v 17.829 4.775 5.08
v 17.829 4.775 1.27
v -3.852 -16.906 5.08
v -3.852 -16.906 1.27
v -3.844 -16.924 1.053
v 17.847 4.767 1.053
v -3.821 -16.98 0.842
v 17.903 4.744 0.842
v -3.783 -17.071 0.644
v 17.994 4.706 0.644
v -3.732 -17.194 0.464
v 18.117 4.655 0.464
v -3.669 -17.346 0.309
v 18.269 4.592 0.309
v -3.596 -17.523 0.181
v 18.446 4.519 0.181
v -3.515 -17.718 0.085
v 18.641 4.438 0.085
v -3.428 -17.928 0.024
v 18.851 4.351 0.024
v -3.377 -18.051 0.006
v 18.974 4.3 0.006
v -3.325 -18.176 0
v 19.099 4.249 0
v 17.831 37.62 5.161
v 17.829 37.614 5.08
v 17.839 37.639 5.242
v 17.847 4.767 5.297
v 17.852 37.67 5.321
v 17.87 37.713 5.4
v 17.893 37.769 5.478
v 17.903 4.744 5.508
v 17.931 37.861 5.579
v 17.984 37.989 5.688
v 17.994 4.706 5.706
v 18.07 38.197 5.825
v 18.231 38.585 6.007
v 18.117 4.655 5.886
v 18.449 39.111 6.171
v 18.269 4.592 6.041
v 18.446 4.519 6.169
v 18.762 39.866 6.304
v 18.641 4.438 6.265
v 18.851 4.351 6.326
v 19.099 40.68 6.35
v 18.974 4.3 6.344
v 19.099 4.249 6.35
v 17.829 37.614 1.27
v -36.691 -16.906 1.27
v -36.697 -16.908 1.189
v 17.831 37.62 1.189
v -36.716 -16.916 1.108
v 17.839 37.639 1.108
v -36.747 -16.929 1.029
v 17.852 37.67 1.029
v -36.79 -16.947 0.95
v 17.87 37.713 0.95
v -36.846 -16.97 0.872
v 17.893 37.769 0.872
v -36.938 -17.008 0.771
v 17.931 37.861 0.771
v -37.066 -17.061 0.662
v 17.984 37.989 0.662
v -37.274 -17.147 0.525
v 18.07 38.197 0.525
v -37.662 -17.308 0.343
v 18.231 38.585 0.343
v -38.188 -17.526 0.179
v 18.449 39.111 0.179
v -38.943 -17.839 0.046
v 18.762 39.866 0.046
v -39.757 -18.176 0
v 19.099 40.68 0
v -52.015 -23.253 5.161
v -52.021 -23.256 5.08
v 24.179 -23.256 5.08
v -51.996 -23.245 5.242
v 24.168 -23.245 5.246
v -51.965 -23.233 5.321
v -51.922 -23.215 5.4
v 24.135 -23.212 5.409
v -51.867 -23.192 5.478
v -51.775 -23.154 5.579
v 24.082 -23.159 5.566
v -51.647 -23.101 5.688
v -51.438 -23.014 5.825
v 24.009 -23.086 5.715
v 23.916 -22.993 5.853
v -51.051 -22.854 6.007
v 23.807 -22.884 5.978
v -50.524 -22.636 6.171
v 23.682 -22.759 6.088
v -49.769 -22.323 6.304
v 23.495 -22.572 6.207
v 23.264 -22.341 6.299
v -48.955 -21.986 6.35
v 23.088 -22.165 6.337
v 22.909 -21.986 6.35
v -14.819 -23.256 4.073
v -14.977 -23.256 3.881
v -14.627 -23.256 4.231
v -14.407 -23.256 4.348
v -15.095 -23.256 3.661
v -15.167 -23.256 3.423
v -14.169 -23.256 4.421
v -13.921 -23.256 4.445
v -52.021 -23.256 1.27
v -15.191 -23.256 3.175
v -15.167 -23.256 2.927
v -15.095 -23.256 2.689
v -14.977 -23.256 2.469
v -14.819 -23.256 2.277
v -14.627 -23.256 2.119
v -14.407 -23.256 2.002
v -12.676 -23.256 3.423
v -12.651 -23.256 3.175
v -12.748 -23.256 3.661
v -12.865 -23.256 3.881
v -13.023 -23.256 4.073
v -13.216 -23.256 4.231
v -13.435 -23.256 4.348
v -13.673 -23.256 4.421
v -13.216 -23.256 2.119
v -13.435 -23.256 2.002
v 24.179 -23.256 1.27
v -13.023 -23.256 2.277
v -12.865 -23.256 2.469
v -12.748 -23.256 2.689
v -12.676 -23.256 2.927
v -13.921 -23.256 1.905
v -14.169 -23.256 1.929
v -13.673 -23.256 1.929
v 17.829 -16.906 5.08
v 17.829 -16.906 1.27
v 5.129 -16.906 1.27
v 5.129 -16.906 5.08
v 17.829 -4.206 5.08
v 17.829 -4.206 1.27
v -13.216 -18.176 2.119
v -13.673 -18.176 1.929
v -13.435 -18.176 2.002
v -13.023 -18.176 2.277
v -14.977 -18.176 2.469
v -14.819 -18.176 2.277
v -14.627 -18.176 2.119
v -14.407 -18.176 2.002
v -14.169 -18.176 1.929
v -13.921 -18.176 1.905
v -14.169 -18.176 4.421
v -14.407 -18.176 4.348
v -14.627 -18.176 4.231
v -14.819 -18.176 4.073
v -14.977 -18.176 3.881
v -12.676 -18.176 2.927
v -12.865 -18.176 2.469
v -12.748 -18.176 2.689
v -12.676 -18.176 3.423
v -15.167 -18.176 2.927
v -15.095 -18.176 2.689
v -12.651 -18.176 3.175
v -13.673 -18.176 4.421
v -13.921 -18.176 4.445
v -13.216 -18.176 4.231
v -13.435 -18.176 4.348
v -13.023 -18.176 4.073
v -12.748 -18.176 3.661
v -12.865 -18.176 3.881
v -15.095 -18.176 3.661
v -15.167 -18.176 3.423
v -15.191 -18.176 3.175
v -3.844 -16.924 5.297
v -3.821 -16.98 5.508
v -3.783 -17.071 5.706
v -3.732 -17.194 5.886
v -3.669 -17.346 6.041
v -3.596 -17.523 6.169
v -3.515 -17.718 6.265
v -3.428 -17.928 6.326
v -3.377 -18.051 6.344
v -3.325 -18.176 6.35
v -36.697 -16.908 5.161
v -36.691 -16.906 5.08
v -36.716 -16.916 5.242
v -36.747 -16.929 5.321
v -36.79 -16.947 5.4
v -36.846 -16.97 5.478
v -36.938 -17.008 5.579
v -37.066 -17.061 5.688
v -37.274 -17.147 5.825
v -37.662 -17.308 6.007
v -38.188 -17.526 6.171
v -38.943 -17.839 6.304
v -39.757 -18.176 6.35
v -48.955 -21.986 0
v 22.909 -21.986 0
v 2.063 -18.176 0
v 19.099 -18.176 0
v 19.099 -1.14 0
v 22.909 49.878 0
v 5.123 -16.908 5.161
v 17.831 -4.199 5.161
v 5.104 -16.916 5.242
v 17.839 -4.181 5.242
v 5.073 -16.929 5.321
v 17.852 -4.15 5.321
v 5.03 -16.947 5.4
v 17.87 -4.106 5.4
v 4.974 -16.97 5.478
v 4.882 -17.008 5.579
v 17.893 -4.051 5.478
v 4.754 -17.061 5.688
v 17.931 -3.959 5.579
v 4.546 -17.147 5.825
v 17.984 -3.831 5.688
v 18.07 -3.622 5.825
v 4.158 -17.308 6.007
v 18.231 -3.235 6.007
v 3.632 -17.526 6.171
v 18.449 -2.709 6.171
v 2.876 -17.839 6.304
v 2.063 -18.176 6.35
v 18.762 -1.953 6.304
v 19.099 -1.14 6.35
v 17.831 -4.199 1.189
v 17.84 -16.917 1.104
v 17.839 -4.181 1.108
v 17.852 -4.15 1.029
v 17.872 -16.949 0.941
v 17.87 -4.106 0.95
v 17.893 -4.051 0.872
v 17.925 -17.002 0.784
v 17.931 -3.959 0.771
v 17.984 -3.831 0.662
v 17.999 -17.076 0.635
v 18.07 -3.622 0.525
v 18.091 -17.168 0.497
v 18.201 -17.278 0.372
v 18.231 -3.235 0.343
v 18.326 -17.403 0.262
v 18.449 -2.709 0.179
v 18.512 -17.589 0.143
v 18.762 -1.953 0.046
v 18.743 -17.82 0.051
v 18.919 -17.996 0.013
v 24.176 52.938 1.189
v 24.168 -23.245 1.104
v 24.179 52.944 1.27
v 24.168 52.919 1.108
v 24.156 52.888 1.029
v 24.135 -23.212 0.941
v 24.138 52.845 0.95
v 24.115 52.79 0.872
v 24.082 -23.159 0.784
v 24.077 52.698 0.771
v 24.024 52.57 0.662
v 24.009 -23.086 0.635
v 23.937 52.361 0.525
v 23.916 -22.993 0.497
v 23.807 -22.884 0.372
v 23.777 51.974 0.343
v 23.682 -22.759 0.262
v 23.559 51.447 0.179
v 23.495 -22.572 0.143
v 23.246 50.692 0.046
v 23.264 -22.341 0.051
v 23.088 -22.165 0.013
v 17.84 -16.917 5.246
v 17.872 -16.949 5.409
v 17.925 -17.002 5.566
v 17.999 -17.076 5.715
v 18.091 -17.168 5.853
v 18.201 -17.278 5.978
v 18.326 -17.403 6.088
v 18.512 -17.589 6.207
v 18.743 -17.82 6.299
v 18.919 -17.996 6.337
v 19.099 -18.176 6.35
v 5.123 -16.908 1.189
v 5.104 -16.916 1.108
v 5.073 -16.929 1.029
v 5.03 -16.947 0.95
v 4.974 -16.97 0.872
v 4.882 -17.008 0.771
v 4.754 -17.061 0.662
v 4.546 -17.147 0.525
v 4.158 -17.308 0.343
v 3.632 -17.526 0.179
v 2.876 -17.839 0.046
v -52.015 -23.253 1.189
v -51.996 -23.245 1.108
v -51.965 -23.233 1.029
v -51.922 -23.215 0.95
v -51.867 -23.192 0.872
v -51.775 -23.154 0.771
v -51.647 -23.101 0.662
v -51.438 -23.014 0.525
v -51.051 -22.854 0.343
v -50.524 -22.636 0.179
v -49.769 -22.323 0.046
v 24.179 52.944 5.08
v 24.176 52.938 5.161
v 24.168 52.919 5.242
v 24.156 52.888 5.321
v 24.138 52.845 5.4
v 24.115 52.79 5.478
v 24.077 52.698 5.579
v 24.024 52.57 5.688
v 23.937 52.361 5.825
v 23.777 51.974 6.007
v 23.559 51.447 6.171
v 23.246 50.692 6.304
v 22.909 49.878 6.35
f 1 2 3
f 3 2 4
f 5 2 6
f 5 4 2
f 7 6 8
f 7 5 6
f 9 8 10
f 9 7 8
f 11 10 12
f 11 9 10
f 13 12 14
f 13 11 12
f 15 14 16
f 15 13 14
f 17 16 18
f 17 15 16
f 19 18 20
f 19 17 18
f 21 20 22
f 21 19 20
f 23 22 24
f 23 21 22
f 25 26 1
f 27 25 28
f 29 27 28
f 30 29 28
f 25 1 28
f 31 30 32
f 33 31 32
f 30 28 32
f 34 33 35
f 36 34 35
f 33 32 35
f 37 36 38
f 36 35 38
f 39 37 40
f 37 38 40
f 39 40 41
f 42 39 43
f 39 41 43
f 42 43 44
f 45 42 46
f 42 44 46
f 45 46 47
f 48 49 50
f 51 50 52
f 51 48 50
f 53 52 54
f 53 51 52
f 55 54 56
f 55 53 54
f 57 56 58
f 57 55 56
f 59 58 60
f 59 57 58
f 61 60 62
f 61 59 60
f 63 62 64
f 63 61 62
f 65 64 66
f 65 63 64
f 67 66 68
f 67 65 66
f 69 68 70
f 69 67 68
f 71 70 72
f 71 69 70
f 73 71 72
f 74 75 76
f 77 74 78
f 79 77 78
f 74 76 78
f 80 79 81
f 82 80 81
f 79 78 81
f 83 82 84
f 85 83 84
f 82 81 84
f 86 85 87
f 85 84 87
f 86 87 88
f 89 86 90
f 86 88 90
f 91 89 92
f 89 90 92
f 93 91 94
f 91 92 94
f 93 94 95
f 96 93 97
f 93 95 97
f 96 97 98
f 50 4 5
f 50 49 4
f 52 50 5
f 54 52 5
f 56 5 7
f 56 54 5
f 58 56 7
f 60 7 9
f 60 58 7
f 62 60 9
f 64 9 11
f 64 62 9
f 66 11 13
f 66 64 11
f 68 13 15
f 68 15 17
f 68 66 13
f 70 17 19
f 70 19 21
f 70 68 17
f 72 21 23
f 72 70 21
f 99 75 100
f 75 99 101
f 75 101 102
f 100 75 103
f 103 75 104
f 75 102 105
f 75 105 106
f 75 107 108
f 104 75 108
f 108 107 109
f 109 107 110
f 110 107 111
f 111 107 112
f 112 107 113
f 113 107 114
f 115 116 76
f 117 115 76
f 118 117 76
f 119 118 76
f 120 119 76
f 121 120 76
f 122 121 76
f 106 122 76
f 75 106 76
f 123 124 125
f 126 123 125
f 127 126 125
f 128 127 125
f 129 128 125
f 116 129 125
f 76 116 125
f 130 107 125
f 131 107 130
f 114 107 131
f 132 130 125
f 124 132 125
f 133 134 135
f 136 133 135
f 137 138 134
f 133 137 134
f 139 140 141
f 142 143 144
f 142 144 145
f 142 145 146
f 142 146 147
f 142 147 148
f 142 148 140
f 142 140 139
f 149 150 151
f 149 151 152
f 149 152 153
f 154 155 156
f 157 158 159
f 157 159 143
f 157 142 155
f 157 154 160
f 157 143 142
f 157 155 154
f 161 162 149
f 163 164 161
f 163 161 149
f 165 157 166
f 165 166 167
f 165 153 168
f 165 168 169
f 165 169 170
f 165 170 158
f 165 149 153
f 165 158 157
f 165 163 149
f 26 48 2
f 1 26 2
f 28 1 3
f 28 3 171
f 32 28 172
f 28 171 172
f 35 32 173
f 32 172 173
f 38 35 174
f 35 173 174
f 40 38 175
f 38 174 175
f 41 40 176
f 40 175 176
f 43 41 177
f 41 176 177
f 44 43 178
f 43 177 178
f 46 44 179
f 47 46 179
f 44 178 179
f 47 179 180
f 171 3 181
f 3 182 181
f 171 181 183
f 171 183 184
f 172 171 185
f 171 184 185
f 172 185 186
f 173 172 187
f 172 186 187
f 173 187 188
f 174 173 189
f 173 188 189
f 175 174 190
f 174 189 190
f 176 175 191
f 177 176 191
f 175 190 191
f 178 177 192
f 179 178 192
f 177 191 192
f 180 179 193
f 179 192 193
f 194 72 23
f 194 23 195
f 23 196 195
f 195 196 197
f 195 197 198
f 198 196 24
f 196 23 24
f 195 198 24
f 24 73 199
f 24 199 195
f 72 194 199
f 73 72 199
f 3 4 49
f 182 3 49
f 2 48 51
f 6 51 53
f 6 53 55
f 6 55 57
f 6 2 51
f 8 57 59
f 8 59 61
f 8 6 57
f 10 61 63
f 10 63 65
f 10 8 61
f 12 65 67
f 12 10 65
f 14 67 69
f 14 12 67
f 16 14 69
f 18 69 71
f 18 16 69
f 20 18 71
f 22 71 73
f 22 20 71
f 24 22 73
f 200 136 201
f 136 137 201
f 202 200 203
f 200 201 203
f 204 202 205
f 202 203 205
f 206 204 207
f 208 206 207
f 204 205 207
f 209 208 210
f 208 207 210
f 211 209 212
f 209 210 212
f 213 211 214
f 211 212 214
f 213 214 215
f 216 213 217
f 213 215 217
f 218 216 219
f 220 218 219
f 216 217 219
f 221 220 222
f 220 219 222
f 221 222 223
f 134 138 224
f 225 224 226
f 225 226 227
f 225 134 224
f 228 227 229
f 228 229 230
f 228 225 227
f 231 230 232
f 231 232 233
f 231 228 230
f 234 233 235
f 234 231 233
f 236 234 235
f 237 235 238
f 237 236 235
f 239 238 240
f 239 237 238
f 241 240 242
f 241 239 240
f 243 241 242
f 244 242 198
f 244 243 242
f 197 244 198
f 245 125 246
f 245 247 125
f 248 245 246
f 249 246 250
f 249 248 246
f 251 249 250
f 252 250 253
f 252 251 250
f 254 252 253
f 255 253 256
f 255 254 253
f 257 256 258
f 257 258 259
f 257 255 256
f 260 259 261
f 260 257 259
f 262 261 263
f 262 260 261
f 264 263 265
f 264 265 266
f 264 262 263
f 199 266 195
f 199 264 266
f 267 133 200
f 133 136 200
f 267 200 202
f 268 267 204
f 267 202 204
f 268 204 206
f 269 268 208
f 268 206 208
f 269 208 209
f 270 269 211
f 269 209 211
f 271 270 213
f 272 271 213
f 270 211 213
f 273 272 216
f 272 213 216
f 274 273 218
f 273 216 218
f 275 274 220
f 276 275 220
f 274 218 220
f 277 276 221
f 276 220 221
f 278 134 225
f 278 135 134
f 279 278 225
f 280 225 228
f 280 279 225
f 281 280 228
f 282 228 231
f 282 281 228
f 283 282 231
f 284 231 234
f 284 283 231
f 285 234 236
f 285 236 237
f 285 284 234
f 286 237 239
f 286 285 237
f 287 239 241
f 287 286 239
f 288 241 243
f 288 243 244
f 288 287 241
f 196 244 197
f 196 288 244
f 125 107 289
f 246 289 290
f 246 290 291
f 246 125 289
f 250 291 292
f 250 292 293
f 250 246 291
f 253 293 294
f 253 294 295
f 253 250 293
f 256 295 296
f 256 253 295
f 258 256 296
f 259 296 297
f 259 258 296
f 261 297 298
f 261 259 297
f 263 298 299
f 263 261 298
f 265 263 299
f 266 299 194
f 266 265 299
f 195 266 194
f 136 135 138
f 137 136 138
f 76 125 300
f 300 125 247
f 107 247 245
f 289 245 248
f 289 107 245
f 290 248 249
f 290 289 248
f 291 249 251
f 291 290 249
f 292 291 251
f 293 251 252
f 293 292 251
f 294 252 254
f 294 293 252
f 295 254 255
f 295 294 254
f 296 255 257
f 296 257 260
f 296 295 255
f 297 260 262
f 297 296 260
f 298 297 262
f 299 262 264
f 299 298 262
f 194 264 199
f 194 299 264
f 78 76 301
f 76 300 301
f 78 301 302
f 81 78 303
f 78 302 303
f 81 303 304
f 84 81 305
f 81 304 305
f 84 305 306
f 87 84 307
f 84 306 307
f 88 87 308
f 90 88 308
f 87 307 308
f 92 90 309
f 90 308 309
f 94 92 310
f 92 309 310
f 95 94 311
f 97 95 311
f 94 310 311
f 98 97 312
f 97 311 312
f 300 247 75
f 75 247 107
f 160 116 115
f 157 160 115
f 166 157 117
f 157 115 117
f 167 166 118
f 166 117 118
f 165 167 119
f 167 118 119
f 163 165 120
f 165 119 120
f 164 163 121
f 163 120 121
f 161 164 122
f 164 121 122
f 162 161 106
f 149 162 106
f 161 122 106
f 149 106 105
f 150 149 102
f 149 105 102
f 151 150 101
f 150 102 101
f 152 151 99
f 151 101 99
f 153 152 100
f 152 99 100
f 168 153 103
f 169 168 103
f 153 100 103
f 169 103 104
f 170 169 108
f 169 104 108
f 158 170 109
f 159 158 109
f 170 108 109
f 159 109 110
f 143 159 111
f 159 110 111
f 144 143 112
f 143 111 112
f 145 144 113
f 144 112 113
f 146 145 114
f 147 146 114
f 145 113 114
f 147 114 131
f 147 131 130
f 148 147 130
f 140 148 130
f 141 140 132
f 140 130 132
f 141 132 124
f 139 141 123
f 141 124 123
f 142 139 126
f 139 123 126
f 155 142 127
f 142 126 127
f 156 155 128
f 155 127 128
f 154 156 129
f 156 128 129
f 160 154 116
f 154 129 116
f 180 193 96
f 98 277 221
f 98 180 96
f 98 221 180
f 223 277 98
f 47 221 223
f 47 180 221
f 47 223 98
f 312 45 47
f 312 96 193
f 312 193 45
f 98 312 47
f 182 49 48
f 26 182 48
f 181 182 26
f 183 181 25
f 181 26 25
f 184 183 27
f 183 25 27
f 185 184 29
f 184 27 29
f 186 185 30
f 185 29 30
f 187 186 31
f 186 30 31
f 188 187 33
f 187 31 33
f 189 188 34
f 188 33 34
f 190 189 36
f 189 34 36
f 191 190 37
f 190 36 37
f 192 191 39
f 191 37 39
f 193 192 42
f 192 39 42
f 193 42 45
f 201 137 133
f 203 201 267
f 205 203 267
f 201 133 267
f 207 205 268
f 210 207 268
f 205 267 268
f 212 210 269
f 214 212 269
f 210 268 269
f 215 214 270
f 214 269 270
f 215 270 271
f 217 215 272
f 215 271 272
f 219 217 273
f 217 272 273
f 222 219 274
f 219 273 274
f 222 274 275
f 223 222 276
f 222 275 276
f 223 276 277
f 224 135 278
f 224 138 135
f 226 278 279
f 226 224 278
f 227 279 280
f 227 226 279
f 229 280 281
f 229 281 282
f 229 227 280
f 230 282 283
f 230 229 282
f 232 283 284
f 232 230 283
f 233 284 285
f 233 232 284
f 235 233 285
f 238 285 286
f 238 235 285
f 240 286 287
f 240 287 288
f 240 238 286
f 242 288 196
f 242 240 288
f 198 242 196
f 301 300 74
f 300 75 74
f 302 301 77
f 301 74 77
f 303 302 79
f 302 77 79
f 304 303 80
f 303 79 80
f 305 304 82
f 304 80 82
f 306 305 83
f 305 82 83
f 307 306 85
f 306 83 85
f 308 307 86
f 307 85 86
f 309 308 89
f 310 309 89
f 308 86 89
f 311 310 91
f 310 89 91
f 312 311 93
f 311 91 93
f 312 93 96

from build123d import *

# Parameters (mm, degrees)
F1_DEPTH = 6.35
F3_R     = 1.27
F2_R     = 1.27
F4_DEPTH = 5.08


with BuildPart() as f1:
    # F0 (on Top) → F1 (new body)
    with BuildSketch(Plane.XY):
        Polygon((24.178737, 52.94433), (-52.021263, -23.25567), (24.178737, -23.25567), align=None)
        Polygon((17.828737, -16.90567), (5.128737, -16.90567), (17.828737, -4.20567), align=None, mode=Mode.SUBTRACT)
        Polygon((-3.851519, -16.90567), (-36.691007, -16.90567), (17.828737, 37.614073), (17.828737, 4.774586), align=None, mode=Mode.SUBTRACT)
    extrude(amount=F1_DEPTH)

    # F3
    f3_edges = [f1.edges().sort_by_distance(p)[0] for p in [
        (-13.921263, 14.84433, 6.35),
        (-13.921263, -23.25567, 6.35),
        (24.178737, 14.84433, 6.35),
        (11.478737, -16.90567, 6.35),
        (11.478737, -10.55567, 6.35),
        (17.828737, -10.55567, 6.35),
        (17.828737, 21.19433, 6.35),
        (6.988609, -6.065542, 6.35),
        (-20.271263, -16.90567, 6.35),
        (-9.431135, 10.354202, 6.35),
        (-13.921263, -23.25567, 0),
        (-13.921263, 14.84433, 0),
        (24.178737, 14.84433, 0),
        (11.478737, -16.90567, 0),
        (11.478737, -10.55567, 0),
        (17.828737, -10.55567, 0),
        (17.828737, 21.19433, 0),
        (6.988609, -6.065542, 0),
        (-20.271263, -16.90567, 0),
        (-9.431135, 10.354202, 0),
    ]]
    fillet(f3_edges, radius=F3_R)

    # F2 (on face) → F4 (cut)
    with BuildSketch(Plane.XZ.offset(23.25567)):
        with Locations((-13.921263, 3.175)):
            Circle(F2_R)
    extrude(amount=-F4_DEPTH, mode=Mode.SUBTRACT)


solid = f1.part
